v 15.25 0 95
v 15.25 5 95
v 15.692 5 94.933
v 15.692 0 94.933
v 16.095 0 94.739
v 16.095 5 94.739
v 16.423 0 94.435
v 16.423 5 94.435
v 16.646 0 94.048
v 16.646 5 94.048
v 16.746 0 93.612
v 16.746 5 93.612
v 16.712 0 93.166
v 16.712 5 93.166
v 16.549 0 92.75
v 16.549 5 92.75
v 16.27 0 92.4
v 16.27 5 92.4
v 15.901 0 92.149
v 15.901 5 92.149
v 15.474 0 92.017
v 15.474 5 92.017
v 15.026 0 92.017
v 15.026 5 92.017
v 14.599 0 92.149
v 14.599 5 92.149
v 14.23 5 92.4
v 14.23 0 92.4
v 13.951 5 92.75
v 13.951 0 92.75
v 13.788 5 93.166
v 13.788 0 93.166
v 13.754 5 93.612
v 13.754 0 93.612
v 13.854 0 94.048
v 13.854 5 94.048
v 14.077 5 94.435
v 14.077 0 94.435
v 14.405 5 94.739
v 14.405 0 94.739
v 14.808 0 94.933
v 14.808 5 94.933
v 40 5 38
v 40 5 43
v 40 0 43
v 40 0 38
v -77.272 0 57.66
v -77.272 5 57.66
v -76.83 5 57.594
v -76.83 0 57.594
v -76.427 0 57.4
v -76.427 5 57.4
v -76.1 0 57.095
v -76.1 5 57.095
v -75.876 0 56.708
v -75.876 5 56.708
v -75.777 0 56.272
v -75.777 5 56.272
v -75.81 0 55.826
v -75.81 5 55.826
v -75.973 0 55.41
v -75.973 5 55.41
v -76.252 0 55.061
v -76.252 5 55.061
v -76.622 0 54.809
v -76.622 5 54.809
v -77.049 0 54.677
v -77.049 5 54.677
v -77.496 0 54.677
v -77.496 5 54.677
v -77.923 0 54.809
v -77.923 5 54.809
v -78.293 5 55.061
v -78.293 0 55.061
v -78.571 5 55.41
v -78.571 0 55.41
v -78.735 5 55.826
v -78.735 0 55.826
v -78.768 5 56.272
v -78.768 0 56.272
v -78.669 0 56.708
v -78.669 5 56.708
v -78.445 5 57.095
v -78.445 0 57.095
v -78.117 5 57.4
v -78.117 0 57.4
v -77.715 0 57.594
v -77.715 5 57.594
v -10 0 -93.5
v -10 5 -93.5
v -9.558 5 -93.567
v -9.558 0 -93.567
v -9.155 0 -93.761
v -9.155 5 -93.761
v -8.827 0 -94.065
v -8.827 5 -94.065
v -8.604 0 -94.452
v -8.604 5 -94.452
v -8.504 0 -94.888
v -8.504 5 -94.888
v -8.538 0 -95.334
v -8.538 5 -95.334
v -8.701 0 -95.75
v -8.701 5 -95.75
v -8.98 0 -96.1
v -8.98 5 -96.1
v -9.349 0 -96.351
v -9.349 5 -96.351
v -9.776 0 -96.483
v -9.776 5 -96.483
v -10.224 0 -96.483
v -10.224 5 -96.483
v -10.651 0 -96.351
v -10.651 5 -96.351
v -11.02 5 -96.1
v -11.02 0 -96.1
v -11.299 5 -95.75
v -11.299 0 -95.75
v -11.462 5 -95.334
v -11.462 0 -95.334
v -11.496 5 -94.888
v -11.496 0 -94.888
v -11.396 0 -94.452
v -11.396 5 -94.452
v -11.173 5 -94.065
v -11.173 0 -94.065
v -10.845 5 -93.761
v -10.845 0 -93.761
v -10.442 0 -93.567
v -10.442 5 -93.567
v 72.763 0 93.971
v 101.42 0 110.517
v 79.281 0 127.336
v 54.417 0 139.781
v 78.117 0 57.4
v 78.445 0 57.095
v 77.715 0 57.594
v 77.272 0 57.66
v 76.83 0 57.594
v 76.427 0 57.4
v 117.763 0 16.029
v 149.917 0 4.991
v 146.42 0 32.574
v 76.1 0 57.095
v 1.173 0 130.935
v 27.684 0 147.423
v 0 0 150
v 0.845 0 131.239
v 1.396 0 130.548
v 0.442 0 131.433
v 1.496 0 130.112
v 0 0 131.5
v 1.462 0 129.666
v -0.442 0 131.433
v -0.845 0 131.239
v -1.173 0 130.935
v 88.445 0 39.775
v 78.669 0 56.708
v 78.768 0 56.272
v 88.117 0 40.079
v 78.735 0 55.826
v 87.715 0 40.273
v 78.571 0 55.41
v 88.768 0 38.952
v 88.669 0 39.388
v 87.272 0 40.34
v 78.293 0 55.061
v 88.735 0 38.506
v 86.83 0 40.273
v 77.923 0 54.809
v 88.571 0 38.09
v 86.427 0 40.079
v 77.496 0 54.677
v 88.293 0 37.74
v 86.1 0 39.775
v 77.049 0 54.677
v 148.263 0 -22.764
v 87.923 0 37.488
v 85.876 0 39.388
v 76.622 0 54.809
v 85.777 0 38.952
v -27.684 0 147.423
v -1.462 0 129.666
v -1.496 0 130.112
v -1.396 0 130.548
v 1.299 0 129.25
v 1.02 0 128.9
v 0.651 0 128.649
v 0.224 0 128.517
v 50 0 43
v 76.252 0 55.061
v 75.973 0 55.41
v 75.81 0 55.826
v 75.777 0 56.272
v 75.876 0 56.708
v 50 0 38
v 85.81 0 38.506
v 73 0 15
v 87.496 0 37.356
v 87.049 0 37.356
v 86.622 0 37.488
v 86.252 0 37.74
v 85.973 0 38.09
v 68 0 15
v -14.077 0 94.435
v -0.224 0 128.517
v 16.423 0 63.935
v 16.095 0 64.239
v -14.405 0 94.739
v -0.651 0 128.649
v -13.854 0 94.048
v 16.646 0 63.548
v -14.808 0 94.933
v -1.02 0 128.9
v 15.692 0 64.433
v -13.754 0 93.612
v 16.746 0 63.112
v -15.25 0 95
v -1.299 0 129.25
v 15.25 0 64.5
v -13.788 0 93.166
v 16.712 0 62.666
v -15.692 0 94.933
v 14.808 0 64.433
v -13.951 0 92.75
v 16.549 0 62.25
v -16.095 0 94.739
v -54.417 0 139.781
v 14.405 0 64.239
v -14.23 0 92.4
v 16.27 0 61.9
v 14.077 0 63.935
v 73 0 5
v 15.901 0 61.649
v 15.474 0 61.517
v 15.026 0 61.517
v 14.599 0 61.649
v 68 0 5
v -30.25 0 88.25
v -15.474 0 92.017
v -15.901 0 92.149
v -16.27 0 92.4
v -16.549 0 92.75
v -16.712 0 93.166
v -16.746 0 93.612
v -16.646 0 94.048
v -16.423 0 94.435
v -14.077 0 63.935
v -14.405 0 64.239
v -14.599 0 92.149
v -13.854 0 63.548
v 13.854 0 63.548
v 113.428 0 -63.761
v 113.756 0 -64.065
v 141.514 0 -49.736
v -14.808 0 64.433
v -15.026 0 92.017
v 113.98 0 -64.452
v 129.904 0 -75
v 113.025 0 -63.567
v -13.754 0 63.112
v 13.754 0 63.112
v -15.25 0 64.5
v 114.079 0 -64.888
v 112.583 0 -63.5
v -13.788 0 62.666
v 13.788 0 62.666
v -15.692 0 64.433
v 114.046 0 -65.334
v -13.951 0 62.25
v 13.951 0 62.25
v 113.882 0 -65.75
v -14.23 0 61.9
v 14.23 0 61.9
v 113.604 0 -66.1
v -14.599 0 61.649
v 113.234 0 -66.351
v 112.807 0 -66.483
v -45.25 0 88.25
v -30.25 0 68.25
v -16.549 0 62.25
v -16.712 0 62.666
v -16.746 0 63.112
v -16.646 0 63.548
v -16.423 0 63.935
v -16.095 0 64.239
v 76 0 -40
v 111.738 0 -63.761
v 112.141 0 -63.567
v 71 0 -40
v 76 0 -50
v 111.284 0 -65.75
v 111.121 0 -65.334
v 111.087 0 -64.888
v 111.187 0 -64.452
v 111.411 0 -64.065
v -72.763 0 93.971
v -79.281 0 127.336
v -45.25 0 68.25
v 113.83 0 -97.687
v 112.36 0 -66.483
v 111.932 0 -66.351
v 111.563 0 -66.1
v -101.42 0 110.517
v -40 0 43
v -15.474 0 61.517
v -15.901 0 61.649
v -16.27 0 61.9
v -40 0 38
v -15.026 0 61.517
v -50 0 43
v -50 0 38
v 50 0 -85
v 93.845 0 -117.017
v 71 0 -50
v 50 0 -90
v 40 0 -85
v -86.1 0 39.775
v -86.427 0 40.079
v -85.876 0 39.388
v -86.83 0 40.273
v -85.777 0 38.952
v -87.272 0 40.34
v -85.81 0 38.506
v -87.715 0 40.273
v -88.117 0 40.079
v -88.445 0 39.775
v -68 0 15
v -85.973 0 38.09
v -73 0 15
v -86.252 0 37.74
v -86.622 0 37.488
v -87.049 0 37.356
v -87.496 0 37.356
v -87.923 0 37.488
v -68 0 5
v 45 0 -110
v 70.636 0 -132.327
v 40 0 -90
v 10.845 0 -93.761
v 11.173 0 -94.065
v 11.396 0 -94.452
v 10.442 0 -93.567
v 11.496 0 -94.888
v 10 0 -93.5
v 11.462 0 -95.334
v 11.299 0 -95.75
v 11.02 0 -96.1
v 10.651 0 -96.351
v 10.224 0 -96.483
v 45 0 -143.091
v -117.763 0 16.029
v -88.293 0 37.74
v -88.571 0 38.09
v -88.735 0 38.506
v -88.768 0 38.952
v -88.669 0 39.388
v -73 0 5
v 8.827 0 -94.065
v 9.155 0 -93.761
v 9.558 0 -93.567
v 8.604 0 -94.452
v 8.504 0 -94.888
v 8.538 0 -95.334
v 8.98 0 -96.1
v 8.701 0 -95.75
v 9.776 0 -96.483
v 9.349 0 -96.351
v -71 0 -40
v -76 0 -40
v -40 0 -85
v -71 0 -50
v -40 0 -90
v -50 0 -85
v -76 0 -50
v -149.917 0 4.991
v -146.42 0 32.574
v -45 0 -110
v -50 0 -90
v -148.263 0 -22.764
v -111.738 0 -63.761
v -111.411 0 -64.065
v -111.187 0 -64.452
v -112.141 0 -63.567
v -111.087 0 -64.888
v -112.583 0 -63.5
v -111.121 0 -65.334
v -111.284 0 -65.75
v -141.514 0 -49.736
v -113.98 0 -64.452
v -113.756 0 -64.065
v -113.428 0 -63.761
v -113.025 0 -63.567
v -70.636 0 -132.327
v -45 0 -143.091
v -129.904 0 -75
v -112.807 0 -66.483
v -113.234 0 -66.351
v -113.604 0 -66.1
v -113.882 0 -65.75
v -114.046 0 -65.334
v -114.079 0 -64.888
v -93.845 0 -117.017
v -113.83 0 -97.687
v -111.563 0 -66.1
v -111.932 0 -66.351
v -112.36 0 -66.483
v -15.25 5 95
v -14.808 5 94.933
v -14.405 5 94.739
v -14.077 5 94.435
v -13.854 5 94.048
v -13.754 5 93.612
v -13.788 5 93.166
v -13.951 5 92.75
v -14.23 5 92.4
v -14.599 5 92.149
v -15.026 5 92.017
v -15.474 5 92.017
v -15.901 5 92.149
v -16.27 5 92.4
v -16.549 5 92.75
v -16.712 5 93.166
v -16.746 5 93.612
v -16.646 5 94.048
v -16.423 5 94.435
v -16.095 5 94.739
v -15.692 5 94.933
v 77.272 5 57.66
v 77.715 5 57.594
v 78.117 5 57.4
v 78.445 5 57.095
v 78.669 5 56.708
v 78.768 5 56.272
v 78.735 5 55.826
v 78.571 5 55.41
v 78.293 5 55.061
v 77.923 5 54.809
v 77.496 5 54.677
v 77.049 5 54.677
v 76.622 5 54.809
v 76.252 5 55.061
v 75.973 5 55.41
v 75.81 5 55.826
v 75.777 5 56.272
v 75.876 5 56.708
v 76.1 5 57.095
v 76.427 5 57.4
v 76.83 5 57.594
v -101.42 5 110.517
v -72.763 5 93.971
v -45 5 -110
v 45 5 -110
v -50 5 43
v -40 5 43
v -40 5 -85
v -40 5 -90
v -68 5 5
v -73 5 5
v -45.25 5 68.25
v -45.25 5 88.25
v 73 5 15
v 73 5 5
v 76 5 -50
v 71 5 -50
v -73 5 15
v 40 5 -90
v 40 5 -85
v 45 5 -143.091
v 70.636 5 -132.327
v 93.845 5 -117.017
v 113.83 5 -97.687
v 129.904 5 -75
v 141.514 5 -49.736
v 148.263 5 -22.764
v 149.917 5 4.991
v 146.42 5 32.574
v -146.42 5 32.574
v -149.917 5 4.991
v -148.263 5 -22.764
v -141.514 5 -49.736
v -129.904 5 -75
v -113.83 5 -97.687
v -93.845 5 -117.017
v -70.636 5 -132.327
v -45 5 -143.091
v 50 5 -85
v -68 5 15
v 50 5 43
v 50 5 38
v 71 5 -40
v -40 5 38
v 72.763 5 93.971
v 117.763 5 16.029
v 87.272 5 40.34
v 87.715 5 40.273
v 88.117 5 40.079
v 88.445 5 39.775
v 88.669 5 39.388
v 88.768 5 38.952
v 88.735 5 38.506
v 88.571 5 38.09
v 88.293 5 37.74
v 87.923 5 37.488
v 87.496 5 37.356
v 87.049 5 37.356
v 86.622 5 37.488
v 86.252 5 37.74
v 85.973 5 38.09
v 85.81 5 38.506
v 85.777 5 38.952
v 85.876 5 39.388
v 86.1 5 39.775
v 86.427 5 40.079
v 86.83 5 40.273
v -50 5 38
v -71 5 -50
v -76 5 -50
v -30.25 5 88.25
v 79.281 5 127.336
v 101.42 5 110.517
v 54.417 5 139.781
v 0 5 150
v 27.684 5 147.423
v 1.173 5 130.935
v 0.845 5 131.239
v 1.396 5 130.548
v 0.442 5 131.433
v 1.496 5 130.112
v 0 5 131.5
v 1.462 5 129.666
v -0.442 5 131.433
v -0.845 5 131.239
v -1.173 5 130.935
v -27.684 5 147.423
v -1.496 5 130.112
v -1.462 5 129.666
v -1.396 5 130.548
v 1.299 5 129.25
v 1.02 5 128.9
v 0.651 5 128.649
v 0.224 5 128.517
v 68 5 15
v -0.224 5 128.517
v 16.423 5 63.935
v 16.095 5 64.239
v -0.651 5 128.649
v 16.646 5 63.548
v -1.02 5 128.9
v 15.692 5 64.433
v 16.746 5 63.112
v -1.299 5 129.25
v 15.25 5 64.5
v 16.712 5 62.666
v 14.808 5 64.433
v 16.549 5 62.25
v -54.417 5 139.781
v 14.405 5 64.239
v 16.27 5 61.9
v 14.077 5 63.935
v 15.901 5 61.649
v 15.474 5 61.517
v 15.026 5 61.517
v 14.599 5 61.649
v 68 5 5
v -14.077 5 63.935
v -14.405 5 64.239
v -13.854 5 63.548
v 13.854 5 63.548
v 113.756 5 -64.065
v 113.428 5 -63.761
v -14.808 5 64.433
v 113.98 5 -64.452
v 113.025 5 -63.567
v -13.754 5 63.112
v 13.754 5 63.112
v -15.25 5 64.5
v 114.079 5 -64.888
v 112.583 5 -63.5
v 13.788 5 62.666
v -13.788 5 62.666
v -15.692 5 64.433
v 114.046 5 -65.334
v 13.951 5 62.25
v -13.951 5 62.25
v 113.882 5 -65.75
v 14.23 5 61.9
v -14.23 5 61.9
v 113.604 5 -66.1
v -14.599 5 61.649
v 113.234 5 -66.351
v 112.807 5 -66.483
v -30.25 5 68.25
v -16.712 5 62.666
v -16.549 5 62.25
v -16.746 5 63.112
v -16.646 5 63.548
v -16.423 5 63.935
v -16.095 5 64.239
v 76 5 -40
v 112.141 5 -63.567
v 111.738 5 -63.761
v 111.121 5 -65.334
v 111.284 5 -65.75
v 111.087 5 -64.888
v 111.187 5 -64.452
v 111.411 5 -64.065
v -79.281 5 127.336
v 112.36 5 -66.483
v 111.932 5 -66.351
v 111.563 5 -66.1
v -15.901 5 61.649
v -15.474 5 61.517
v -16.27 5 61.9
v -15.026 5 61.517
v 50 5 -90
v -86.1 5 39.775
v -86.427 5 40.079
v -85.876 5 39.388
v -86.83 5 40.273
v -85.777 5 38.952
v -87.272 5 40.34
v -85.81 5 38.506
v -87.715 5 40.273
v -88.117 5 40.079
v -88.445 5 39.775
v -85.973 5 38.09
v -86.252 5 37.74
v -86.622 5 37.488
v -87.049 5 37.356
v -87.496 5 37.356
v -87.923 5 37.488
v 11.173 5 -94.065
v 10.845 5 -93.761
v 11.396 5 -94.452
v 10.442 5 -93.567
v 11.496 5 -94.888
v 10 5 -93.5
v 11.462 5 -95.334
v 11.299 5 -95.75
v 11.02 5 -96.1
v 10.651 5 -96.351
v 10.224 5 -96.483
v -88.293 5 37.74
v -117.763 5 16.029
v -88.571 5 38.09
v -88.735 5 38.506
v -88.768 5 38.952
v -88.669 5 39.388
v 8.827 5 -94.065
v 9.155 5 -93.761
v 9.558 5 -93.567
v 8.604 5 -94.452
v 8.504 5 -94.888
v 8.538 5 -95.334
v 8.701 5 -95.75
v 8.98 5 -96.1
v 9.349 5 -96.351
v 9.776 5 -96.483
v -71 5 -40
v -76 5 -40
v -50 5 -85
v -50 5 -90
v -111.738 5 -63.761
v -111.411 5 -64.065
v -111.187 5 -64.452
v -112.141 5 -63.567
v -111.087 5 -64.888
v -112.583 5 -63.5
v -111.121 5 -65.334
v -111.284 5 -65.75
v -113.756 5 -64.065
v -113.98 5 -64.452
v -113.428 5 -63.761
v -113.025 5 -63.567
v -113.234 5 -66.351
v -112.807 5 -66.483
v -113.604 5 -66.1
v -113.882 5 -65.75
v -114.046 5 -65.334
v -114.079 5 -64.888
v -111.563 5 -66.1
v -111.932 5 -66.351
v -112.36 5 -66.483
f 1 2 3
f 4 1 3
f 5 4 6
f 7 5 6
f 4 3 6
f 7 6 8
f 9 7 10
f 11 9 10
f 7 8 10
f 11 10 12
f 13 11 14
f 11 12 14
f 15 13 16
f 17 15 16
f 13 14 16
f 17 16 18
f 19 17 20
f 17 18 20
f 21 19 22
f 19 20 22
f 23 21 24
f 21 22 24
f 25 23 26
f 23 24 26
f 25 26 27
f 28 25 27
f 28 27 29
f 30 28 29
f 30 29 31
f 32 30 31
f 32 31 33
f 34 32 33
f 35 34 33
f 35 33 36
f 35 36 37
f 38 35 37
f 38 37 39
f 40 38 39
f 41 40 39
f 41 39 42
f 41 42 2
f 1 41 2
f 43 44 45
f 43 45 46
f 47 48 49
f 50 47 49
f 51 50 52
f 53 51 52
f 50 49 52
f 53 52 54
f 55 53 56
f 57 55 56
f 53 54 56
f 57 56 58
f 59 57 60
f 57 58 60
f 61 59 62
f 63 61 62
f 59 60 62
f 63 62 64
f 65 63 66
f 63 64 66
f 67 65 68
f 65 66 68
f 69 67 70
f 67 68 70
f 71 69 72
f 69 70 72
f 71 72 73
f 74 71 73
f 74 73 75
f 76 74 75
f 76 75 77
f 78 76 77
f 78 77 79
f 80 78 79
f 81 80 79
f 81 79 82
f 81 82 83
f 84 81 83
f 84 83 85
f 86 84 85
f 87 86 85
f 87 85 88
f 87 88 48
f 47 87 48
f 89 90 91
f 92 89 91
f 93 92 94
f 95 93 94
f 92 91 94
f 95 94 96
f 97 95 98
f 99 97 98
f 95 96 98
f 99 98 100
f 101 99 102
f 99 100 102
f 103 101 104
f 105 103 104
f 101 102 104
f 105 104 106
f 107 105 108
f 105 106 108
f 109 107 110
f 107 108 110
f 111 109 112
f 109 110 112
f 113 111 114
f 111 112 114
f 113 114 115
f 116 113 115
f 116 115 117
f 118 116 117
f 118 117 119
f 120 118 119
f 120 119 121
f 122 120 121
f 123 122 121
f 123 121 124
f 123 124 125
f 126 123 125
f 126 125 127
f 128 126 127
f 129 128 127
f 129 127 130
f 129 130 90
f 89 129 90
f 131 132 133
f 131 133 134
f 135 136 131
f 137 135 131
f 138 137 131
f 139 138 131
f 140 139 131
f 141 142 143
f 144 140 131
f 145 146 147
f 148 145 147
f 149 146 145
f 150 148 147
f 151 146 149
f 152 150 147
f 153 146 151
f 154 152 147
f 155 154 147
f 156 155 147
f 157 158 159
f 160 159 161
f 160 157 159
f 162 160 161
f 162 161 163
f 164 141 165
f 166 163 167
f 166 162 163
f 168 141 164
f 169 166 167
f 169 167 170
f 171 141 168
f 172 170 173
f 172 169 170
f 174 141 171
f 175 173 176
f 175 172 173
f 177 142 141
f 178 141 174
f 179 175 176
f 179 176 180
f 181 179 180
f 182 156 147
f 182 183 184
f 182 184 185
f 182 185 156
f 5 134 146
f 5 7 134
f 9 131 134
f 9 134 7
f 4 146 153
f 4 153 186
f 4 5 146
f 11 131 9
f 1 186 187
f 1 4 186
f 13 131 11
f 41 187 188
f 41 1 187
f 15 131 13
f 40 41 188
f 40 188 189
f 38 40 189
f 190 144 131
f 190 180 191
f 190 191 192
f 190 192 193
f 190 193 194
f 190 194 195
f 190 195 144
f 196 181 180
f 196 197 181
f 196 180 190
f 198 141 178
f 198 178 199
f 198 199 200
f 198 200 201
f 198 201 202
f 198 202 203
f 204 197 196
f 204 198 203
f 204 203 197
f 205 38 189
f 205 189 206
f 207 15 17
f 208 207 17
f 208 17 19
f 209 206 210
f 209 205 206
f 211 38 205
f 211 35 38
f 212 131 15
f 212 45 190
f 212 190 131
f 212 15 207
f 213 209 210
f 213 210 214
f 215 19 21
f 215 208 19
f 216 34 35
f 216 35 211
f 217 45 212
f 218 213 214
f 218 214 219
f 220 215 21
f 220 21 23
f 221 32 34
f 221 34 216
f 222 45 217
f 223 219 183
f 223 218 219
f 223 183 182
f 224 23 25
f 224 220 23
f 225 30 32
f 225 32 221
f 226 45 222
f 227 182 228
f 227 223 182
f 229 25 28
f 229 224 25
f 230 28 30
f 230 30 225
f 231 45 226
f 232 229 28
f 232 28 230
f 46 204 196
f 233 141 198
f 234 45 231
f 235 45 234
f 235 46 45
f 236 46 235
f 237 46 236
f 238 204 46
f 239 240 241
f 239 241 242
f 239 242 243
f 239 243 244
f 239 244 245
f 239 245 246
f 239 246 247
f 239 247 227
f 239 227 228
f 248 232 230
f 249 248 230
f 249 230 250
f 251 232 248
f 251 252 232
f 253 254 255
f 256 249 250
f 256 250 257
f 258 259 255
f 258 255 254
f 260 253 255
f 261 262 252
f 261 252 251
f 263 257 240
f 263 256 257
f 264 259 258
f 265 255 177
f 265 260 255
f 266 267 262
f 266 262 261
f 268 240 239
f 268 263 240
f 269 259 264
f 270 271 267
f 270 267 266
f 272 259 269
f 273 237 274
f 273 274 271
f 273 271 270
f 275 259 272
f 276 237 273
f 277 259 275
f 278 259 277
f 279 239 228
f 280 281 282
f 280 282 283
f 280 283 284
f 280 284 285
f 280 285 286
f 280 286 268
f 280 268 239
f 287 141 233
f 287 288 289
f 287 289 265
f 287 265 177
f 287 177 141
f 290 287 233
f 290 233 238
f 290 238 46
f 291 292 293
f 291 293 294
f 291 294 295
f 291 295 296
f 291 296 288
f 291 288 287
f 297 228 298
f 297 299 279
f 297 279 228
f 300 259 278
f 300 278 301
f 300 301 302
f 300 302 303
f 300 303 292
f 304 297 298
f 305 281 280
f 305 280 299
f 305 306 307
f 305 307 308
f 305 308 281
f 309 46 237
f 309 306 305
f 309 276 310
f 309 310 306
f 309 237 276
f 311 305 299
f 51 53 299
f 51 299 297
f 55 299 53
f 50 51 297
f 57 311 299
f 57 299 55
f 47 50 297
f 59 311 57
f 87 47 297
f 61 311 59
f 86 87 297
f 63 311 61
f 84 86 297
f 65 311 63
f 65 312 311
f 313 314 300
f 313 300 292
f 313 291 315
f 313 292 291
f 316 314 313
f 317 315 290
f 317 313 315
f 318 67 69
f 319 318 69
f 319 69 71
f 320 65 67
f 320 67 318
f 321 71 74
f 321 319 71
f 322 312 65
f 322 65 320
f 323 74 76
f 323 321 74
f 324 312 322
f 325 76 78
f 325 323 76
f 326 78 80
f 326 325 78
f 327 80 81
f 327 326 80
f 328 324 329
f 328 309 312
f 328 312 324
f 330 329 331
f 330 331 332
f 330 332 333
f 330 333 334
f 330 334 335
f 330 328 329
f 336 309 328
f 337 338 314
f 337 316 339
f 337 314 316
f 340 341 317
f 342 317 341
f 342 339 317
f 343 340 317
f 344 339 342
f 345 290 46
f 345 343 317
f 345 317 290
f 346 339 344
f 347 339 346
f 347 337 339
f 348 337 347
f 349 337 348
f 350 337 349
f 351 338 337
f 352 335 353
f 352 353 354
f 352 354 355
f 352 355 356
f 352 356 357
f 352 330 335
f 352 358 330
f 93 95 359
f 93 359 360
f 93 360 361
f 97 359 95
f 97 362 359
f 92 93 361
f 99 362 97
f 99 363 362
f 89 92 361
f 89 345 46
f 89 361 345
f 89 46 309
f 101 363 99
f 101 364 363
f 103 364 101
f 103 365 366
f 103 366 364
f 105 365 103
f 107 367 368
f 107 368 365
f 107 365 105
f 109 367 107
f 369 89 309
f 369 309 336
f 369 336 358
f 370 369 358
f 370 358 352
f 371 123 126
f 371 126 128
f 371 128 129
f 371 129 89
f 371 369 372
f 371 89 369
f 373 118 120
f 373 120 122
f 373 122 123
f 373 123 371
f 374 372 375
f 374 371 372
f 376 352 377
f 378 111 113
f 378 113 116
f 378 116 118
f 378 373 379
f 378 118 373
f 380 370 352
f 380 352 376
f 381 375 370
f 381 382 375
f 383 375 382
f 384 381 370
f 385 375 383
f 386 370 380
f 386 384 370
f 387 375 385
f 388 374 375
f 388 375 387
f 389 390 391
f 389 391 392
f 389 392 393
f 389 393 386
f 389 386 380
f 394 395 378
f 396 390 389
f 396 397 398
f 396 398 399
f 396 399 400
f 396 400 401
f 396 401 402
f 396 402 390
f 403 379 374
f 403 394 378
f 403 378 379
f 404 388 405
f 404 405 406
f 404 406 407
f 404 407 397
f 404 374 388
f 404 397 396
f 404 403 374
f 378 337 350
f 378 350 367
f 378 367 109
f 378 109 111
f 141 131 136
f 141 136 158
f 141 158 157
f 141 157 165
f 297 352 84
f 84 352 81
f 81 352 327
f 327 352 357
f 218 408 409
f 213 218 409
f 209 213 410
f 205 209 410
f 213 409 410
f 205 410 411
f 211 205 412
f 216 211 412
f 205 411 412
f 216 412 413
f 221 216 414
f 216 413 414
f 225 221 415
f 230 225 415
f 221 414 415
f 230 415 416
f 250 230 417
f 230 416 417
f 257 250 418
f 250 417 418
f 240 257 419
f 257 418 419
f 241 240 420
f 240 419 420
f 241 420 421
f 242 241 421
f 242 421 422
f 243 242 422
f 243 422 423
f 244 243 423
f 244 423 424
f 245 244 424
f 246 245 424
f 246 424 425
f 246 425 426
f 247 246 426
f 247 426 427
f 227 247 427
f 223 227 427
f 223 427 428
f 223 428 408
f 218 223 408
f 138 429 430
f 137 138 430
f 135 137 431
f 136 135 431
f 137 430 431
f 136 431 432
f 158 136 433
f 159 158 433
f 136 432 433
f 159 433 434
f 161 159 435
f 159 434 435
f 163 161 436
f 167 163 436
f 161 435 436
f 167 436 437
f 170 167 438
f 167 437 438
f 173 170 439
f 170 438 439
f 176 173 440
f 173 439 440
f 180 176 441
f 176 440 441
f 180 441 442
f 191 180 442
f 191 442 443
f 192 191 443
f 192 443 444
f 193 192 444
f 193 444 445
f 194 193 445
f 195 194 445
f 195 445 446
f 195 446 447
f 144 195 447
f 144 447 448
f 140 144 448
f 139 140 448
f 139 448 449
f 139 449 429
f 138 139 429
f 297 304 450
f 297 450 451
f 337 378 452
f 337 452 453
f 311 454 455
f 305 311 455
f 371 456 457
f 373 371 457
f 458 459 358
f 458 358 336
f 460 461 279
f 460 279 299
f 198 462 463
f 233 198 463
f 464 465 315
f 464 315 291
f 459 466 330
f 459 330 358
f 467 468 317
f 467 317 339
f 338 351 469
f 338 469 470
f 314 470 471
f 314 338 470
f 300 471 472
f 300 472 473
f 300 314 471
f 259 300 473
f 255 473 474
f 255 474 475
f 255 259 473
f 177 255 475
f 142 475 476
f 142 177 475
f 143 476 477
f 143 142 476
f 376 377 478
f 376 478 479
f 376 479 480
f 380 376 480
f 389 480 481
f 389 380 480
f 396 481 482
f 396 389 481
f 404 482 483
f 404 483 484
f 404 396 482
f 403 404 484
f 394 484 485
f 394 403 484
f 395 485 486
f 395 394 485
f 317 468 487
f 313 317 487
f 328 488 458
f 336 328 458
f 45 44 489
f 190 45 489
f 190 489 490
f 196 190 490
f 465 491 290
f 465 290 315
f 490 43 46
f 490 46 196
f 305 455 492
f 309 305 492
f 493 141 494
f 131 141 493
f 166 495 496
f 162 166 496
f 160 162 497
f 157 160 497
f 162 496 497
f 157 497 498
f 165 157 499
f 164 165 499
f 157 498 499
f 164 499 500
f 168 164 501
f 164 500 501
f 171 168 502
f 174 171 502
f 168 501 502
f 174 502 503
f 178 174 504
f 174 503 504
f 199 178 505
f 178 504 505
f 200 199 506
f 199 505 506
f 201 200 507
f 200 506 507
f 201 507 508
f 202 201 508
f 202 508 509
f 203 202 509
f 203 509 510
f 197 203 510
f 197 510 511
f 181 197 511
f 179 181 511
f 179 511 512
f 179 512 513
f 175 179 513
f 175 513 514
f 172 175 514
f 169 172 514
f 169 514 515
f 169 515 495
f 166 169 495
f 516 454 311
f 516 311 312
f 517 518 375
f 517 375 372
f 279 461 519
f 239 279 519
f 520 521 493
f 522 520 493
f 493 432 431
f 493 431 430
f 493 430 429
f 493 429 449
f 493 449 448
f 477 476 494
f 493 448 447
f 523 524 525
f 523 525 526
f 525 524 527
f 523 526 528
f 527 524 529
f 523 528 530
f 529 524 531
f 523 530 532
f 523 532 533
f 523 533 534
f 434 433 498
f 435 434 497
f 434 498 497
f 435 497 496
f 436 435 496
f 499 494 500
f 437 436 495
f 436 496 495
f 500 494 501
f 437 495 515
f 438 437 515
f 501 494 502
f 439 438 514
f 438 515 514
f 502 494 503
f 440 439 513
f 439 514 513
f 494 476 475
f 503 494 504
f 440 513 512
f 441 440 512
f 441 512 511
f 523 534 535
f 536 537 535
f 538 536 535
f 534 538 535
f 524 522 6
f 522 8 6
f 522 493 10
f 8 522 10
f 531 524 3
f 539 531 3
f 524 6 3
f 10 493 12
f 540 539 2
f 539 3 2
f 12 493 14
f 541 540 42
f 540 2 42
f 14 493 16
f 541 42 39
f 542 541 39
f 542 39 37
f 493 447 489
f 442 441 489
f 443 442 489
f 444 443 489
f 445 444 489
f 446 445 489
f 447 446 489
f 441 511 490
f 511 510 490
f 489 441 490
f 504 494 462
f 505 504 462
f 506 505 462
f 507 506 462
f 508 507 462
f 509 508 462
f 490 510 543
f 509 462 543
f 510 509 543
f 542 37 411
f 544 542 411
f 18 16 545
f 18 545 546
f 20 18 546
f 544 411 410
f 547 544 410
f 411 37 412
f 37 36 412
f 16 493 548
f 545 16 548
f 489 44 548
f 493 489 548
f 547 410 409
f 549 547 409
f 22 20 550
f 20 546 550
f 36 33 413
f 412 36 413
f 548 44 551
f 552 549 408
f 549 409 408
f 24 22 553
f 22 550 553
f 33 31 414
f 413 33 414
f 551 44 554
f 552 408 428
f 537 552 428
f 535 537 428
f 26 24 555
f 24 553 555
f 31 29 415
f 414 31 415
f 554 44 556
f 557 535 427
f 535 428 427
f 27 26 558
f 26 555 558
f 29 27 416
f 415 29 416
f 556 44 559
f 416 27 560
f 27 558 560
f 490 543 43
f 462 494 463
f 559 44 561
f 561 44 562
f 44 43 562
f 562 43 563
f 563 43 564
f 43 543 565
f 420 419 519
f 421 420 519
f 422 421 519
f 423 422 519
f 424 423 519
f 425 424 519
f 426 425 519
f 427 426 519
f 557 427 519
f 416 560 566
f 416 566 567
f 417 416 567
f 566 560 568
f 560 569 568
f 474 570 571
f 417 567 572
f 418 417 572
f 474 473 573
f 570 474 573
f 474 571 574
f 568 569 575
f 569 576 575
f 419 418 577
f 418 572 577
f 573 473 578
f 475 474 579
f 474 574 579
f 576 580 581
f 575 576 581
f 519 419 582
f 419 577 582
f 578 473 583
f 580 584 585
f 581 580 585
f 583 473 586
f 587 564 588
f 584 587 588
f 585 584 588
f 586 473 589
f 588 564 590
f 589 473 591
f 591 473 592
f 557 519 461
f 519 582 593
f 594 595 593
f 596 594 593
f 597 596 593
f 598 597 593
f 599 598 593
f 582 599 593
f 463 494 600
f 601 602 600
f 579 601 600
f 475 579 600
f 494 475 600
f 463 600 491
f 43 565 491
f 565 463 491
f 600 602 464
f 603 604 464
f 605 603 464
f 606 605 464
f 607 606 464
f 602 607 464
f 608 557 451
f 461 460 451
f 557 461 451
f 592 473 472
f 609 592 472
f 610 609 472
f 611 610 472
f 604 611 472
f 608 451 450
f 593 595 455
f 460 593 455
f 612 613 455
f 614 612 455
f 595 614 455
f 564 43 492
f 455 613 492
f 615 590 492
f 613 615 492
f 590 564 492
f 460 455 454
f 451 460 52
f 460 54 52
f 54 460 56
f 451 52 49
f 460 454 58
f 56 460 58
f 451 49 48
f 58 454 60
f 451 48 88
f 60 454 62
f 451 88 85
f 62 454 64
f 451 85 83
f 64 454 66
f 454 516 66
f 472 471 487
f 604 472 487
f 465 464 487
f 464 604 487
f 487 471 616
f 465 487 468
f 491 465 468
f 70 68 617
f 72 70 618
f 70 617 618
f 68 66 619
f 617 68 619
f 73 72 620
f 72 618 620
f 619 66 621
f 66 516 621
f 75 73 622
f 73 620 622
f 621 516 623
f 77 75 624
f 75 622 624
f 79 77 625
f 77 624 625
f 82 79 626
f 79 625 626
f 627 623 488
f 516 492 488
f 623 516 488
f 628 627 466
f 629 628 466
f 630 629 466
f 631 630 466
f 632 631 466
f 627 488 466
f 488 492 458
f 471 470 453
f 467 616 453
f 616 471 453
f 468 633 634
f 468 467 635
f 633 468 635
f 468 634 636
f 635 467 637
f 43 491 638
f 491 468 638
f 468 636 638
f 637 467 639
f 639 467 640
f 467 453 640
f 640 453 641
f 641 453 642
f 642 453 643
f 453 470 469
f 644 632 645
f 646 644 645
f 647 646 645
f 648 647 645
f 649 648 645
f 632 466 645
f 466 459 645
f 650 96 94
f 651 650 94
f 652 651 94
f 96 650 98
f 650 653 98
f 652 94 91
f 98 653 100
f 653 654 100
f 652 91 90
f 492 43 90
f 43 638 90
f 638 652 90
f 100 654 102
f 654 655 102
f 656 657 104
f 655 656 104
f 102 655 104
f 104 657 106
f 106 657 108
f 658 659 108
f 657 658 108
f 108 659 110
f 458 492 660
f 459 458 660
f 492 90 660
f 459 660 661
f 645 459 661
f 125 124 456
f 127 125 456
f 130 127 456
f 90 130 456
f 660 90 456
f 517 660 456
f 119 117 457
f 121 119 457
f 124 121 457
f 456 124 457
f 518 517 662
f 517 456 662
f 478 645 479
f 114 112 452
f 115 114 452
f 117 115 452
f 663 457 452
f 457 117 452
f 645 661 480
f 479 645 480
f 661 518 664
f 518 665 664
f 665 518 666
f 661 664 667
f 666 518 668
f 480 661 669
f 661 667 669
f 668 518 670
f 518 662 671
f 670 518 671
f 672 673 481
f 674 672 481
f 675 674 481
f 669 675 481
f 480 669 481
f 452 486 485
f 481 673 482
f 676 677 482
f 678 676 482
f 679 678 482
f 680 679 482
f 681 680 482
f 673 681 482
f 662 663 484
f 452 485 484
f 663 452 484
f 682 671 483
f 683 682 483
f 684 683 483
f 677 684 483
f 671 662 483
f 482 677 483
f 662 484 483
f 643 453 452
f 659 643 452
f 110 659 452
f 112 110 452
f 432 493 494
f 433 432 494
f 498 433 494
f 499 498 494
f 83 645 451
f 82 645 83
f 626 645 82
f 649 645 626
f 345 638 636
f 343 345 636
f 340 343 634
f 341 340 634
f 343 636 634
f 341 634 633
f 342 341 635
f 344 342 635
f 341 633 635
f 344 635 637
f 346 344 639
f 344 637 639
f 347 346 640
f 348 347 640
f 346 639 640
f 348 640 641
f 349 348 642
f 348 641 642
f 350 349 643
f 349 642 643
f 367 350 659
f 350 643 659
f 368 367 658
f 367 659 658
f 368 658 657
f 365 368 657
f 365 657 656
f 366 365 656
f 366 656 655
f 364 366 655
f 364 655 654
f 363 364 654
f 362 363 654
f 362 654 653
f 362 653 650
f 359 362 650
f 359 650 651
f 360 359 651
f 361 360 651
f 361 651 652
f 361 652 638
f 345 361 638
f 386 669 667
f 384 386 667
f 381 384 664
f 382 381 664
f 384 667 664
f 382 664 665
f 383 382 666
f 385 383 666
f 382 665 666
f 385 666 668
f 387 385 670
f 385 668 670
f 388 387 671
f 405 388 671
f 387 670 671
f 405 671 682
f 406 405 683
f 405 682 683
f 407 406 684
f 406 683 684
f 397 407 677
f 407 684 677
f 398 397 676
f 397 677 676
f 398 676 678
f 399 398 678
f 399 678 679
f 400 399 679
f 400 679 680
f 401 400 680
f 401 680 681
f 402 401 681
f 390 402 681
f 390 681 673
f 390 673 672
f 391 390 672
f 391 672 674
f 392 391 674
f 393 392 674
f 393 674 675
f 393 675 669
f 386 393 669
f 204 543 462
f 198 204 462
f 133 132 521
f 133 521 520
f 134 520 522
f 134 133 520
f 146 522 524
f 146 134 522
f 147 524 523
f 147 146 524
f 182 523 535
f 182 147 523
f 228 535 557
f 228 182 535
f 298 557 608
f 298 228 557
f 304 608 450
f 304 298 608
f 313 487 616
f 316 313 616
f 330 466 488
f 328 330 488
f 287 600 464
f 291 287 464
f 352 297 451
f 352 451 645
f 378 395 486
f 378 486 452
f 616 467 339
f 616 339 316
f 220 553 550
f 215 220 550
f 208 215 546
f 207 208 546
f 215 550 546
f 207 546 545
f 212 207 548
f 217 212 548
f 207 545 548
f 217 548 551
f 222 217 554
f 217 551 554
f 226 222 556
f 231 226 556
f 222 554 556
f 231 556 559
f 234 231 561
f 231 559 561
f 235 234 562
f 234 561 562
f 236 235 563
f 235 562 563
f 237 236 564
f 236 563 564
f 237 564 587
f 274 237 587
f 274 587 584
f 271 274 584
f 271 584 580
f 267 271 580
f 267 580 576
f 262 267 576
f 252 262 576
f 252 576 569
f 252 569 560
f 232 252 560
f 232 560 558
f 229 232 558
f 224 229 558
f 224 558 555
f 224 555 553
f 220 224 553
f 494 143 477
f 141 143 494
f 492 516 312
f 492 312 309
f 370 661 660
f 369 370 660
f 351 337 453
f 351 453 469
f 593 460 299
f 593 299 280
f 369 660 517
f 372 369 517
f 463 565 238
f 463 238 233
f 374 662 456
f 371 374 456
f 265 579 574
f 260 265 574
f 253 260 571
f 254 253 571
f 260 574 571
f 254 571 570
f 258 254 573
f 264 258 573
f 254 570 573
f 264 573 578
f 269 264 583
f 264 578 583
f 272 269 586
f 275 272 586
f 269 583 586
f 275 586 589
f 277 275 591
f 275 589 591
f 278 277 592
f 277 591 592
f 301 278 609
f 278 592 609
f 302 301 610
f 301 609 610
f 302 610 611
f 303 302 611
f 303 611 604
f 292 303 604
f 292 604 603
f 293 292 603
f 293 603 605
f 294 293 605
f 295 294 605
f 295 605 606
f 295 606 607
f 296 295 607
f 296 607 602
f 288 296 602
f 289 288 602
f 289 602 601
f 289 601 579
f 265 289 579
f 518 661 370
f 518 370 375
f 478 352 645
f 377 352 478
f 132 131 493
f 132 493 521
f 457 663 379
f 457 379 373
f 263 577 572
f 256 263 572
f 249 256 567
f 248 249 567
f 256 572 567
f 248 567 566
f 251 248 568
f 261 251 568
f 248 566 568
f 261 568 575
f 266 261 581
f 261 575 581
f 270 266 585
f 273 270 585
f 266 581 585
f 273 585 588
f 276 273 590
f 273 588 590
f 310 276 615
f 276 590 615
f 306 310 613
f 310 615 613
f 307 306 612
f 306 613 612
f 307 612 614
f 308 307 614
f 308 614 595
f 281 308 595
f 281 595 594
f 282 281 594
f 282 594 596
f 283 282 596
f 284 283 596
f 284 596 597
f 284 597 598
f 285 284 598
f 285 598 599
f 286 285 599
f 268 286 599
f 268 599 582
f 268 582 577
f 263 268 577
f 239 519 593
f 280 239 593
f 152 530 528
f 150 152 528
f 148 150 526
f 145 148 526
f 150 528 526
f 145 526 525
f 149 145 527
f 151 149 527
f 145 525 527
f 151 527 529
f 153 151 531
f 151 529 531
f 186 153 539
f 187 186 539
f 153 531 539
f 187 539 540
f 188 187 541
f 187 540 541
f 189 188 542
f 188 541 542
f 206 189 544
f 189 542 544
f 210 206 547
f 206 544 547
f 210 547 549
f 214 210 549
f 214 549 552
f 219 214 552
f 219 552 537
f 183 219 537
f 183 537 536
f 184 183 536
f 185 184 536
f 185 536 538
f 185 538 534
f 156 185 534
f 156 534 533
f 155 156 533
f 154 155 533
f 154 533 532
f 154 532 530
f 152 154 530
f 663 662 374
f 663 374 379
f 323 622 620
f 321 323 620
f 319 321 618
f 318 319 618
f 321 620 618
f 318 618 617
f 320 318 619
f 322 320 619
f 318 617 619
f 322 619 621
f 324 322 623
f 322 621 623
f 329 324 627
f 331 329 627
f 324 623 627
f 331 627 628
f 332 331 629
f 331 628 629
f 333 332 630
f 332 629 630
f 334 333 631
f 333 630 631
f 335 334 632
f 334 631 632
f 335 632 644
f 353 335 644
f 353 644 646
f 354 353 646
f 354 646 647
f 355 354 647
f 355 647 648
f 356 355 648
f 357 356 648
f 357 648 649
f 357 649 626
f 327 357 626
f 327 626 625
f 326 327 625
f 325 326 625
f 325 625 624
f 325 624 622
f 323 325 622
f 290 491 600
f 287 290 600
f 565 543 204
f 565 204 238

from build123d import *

# Parameters (mm, degrees)
BOSS_EXTRUDE1_DEPTH = 5
SKETCH2_R           = 1.5
CUT_EXTRUDE1_DEPTH  = 10
SKETCH3_W           = 10
SKETCH3_H           = 5
SKETCH3_W_2         = 5
SKETCH3_H_2         = 10
CUT_EXTRUDE2_DEPTH  = 10
SKETCH4_R           = 1.5
SKETCH4_W           = 15
SKETCH4_H           = 20
CUT_EXTRUDE3_DEPTH  = 10
SKETCH5_R           = 1.5
CUT_EXTRUDE4_DEPTH  = 10


with BuildPart() as part:
    # Sketch1 → Boss-Extrude1 (new body)
    with BuildSketch(Plane(origin=(0, 0, 0), x_dir=(1, 0, 0), z_dir=(0, 1, 0))):
        with BuildLine():
            Line((-45, 110), (45, 110))
            Line((45, 110), (45, 143.090880213))
            ThreePointArc((45, 143.090880213), (129.903810568, 75), (146.420337314, -32.574296936))
            Line((146.420337314, -32.574296936), (117.762794416, -16.02885683))
            Line((117.762794416, -16.02885683), (72.762794416, -93.97114317))
            Line((72.762794416, -93.97114317), (101.420337314, -110.516583277))
            ThreePointArc((101.420337314, -110.516583277), (0, -150), (-101.420337314, -110.516583277))
            Line((-101.420337314, -110.516583277), (-72.762794416, -93.97114317))
            Line((-72.762794416, -93.97114317), (-117.762794416, -16.02885683))
            Line((-117.762794416, -16.02885683), (-146.420337314, -32.574296936))
            ThreePointArc((-146.420337314, -32.574296936), (-129.903810568, 75), (-45, 143.090880213))
            Line((-45, 143.090880213), (-45, 110))
        make_face()
    extrude(amount=BOSS_EXTRUDE1_DEPTH)

    # Sketch2 → Cut-Extrude1 (cut)
    with BuildSketch(Plane(origin=(0, 5, 0), x_dir=(1, 0, 0), z_dir=(0, 1, 0))):
        with Locations(Location((-10, 95, 0), (0, 0, 270))):
            Circle(SKETCH2_R)
        with Locations(Location((10, 95, 0), (0, 0, 270))):
            Circle(SKETCH2_R)
        with Locations(Location((-87.27241336, -38.839745962, 0), (0, 0, 270))):
            Circle(SKETCH2_R)
        with Locations(Location((-77.27241336, -56.160254038, 0), (0, 0, 270))):
            Circle(SKETCH2_R)
        with Locations(Location((77.27241336, -56.160254038, 0), (0, 0, 270))):
            Circle(SKETCH2_R)
        with Locations(Location((87.27241336, -38.839745962, 0), (0, 0, 270))):
            Circle(SKETCH2_R)
    extrude(amount=-CUT_EXTRUDE1_DEPTH, mode=Mode.SUBTRACT)

    # Sketch3 → Cut-Extrude2 (cut)
    with BuildSketch(Plane(origin=(0, 5, 0), x_dir=(1, 0, 0), z_dir=(0, 1, 0))):
        with Locations((45, 87.5)):
            Rectangle(SKETCH3_W, SKETCH3_H)
        with Locations((-45, 87.5)):
            Rectangle(SKETCH3_W, SKETCH3_H)
        with Locations((-73.5, 45)):
            Rectangle(SKETCH3_W_2, SKETCH3_H_2)
        with Locations((73.5, 45)):
            Rectangle(SKETCH3_W_2, SKETCH3_H_2)
        with Locations((-45, -40.5)):
            Rectangle(SKETCH3_W, SKETCH3_H)
        with Locations((45, -40.5)):
            Rectangle(SKETCH3_W, SKETCH3_H)
        with Locations((-70.5, -10)):
            Rectangle(SKETCH3_W_2, SKETCH3_H_2)
        with Locations((70.5, -10)):
            Rectangle(SKETCH3_W_2, SKETCH3_H_2)
    extrude(amount=-CUT_EXTRUDE2_DEPTH, mode=Mode.SUBTRACT)

    # Sketch4 → Cut-Extrude3 (cut)
    with BuildSketch(Plane(origin=(0, 5, 0), x_dir=(1, 0, 0), z_dir=(0, 1, 0))):
        with Locations(Location((-15.25, -63, 0), (0, 0, 270))):
            Circle(SKETCH4_R)
        with Locations(Location((15.25, -63, 0), (0, 0, 270))):
            Circle(SKETCH4_R)
        with Locations(Location((-15.25, -93.5, 0), (0, 0, 270))):
            Circle(SKETCH4_R)
        with Locations(Location((15.25, -93.5, 0), (0, 0, 270))):
            Circle(SKETCH4_R)
        with Locations((-37.75, -78.25)):
            Rectangle(SKETCH4_W, SKETCH4_H)
    extrude(amount=-CUT_EXTRUDE3_DEPTH, mode=Mode.SUBTRACT)

    # Sketch5 → Cut-Extrude4 (cut)
    with BuildSketch(Plane(origin=(0, 5, 0), x_dir=(1, 0, 0), z_dir=(0, 1, 0))):
        with Locations(Location((-112.583302492, 65, 0), (0, 0, 270))):
            Circle(SKETCH5_R)
        with Locations(Location((112.583302492, 65, 0), (0, 0, 270))):
            Circle(SKETCH5_R)
        with Locations(Location((0, -130, 0), (0, 0, 270))):
            Circle(SKETCH5_R)
    extrude(amount=-CUT_EXTRUDE4_DEPTH, mode=Mode.SUBTRACT)


solid = part.part
